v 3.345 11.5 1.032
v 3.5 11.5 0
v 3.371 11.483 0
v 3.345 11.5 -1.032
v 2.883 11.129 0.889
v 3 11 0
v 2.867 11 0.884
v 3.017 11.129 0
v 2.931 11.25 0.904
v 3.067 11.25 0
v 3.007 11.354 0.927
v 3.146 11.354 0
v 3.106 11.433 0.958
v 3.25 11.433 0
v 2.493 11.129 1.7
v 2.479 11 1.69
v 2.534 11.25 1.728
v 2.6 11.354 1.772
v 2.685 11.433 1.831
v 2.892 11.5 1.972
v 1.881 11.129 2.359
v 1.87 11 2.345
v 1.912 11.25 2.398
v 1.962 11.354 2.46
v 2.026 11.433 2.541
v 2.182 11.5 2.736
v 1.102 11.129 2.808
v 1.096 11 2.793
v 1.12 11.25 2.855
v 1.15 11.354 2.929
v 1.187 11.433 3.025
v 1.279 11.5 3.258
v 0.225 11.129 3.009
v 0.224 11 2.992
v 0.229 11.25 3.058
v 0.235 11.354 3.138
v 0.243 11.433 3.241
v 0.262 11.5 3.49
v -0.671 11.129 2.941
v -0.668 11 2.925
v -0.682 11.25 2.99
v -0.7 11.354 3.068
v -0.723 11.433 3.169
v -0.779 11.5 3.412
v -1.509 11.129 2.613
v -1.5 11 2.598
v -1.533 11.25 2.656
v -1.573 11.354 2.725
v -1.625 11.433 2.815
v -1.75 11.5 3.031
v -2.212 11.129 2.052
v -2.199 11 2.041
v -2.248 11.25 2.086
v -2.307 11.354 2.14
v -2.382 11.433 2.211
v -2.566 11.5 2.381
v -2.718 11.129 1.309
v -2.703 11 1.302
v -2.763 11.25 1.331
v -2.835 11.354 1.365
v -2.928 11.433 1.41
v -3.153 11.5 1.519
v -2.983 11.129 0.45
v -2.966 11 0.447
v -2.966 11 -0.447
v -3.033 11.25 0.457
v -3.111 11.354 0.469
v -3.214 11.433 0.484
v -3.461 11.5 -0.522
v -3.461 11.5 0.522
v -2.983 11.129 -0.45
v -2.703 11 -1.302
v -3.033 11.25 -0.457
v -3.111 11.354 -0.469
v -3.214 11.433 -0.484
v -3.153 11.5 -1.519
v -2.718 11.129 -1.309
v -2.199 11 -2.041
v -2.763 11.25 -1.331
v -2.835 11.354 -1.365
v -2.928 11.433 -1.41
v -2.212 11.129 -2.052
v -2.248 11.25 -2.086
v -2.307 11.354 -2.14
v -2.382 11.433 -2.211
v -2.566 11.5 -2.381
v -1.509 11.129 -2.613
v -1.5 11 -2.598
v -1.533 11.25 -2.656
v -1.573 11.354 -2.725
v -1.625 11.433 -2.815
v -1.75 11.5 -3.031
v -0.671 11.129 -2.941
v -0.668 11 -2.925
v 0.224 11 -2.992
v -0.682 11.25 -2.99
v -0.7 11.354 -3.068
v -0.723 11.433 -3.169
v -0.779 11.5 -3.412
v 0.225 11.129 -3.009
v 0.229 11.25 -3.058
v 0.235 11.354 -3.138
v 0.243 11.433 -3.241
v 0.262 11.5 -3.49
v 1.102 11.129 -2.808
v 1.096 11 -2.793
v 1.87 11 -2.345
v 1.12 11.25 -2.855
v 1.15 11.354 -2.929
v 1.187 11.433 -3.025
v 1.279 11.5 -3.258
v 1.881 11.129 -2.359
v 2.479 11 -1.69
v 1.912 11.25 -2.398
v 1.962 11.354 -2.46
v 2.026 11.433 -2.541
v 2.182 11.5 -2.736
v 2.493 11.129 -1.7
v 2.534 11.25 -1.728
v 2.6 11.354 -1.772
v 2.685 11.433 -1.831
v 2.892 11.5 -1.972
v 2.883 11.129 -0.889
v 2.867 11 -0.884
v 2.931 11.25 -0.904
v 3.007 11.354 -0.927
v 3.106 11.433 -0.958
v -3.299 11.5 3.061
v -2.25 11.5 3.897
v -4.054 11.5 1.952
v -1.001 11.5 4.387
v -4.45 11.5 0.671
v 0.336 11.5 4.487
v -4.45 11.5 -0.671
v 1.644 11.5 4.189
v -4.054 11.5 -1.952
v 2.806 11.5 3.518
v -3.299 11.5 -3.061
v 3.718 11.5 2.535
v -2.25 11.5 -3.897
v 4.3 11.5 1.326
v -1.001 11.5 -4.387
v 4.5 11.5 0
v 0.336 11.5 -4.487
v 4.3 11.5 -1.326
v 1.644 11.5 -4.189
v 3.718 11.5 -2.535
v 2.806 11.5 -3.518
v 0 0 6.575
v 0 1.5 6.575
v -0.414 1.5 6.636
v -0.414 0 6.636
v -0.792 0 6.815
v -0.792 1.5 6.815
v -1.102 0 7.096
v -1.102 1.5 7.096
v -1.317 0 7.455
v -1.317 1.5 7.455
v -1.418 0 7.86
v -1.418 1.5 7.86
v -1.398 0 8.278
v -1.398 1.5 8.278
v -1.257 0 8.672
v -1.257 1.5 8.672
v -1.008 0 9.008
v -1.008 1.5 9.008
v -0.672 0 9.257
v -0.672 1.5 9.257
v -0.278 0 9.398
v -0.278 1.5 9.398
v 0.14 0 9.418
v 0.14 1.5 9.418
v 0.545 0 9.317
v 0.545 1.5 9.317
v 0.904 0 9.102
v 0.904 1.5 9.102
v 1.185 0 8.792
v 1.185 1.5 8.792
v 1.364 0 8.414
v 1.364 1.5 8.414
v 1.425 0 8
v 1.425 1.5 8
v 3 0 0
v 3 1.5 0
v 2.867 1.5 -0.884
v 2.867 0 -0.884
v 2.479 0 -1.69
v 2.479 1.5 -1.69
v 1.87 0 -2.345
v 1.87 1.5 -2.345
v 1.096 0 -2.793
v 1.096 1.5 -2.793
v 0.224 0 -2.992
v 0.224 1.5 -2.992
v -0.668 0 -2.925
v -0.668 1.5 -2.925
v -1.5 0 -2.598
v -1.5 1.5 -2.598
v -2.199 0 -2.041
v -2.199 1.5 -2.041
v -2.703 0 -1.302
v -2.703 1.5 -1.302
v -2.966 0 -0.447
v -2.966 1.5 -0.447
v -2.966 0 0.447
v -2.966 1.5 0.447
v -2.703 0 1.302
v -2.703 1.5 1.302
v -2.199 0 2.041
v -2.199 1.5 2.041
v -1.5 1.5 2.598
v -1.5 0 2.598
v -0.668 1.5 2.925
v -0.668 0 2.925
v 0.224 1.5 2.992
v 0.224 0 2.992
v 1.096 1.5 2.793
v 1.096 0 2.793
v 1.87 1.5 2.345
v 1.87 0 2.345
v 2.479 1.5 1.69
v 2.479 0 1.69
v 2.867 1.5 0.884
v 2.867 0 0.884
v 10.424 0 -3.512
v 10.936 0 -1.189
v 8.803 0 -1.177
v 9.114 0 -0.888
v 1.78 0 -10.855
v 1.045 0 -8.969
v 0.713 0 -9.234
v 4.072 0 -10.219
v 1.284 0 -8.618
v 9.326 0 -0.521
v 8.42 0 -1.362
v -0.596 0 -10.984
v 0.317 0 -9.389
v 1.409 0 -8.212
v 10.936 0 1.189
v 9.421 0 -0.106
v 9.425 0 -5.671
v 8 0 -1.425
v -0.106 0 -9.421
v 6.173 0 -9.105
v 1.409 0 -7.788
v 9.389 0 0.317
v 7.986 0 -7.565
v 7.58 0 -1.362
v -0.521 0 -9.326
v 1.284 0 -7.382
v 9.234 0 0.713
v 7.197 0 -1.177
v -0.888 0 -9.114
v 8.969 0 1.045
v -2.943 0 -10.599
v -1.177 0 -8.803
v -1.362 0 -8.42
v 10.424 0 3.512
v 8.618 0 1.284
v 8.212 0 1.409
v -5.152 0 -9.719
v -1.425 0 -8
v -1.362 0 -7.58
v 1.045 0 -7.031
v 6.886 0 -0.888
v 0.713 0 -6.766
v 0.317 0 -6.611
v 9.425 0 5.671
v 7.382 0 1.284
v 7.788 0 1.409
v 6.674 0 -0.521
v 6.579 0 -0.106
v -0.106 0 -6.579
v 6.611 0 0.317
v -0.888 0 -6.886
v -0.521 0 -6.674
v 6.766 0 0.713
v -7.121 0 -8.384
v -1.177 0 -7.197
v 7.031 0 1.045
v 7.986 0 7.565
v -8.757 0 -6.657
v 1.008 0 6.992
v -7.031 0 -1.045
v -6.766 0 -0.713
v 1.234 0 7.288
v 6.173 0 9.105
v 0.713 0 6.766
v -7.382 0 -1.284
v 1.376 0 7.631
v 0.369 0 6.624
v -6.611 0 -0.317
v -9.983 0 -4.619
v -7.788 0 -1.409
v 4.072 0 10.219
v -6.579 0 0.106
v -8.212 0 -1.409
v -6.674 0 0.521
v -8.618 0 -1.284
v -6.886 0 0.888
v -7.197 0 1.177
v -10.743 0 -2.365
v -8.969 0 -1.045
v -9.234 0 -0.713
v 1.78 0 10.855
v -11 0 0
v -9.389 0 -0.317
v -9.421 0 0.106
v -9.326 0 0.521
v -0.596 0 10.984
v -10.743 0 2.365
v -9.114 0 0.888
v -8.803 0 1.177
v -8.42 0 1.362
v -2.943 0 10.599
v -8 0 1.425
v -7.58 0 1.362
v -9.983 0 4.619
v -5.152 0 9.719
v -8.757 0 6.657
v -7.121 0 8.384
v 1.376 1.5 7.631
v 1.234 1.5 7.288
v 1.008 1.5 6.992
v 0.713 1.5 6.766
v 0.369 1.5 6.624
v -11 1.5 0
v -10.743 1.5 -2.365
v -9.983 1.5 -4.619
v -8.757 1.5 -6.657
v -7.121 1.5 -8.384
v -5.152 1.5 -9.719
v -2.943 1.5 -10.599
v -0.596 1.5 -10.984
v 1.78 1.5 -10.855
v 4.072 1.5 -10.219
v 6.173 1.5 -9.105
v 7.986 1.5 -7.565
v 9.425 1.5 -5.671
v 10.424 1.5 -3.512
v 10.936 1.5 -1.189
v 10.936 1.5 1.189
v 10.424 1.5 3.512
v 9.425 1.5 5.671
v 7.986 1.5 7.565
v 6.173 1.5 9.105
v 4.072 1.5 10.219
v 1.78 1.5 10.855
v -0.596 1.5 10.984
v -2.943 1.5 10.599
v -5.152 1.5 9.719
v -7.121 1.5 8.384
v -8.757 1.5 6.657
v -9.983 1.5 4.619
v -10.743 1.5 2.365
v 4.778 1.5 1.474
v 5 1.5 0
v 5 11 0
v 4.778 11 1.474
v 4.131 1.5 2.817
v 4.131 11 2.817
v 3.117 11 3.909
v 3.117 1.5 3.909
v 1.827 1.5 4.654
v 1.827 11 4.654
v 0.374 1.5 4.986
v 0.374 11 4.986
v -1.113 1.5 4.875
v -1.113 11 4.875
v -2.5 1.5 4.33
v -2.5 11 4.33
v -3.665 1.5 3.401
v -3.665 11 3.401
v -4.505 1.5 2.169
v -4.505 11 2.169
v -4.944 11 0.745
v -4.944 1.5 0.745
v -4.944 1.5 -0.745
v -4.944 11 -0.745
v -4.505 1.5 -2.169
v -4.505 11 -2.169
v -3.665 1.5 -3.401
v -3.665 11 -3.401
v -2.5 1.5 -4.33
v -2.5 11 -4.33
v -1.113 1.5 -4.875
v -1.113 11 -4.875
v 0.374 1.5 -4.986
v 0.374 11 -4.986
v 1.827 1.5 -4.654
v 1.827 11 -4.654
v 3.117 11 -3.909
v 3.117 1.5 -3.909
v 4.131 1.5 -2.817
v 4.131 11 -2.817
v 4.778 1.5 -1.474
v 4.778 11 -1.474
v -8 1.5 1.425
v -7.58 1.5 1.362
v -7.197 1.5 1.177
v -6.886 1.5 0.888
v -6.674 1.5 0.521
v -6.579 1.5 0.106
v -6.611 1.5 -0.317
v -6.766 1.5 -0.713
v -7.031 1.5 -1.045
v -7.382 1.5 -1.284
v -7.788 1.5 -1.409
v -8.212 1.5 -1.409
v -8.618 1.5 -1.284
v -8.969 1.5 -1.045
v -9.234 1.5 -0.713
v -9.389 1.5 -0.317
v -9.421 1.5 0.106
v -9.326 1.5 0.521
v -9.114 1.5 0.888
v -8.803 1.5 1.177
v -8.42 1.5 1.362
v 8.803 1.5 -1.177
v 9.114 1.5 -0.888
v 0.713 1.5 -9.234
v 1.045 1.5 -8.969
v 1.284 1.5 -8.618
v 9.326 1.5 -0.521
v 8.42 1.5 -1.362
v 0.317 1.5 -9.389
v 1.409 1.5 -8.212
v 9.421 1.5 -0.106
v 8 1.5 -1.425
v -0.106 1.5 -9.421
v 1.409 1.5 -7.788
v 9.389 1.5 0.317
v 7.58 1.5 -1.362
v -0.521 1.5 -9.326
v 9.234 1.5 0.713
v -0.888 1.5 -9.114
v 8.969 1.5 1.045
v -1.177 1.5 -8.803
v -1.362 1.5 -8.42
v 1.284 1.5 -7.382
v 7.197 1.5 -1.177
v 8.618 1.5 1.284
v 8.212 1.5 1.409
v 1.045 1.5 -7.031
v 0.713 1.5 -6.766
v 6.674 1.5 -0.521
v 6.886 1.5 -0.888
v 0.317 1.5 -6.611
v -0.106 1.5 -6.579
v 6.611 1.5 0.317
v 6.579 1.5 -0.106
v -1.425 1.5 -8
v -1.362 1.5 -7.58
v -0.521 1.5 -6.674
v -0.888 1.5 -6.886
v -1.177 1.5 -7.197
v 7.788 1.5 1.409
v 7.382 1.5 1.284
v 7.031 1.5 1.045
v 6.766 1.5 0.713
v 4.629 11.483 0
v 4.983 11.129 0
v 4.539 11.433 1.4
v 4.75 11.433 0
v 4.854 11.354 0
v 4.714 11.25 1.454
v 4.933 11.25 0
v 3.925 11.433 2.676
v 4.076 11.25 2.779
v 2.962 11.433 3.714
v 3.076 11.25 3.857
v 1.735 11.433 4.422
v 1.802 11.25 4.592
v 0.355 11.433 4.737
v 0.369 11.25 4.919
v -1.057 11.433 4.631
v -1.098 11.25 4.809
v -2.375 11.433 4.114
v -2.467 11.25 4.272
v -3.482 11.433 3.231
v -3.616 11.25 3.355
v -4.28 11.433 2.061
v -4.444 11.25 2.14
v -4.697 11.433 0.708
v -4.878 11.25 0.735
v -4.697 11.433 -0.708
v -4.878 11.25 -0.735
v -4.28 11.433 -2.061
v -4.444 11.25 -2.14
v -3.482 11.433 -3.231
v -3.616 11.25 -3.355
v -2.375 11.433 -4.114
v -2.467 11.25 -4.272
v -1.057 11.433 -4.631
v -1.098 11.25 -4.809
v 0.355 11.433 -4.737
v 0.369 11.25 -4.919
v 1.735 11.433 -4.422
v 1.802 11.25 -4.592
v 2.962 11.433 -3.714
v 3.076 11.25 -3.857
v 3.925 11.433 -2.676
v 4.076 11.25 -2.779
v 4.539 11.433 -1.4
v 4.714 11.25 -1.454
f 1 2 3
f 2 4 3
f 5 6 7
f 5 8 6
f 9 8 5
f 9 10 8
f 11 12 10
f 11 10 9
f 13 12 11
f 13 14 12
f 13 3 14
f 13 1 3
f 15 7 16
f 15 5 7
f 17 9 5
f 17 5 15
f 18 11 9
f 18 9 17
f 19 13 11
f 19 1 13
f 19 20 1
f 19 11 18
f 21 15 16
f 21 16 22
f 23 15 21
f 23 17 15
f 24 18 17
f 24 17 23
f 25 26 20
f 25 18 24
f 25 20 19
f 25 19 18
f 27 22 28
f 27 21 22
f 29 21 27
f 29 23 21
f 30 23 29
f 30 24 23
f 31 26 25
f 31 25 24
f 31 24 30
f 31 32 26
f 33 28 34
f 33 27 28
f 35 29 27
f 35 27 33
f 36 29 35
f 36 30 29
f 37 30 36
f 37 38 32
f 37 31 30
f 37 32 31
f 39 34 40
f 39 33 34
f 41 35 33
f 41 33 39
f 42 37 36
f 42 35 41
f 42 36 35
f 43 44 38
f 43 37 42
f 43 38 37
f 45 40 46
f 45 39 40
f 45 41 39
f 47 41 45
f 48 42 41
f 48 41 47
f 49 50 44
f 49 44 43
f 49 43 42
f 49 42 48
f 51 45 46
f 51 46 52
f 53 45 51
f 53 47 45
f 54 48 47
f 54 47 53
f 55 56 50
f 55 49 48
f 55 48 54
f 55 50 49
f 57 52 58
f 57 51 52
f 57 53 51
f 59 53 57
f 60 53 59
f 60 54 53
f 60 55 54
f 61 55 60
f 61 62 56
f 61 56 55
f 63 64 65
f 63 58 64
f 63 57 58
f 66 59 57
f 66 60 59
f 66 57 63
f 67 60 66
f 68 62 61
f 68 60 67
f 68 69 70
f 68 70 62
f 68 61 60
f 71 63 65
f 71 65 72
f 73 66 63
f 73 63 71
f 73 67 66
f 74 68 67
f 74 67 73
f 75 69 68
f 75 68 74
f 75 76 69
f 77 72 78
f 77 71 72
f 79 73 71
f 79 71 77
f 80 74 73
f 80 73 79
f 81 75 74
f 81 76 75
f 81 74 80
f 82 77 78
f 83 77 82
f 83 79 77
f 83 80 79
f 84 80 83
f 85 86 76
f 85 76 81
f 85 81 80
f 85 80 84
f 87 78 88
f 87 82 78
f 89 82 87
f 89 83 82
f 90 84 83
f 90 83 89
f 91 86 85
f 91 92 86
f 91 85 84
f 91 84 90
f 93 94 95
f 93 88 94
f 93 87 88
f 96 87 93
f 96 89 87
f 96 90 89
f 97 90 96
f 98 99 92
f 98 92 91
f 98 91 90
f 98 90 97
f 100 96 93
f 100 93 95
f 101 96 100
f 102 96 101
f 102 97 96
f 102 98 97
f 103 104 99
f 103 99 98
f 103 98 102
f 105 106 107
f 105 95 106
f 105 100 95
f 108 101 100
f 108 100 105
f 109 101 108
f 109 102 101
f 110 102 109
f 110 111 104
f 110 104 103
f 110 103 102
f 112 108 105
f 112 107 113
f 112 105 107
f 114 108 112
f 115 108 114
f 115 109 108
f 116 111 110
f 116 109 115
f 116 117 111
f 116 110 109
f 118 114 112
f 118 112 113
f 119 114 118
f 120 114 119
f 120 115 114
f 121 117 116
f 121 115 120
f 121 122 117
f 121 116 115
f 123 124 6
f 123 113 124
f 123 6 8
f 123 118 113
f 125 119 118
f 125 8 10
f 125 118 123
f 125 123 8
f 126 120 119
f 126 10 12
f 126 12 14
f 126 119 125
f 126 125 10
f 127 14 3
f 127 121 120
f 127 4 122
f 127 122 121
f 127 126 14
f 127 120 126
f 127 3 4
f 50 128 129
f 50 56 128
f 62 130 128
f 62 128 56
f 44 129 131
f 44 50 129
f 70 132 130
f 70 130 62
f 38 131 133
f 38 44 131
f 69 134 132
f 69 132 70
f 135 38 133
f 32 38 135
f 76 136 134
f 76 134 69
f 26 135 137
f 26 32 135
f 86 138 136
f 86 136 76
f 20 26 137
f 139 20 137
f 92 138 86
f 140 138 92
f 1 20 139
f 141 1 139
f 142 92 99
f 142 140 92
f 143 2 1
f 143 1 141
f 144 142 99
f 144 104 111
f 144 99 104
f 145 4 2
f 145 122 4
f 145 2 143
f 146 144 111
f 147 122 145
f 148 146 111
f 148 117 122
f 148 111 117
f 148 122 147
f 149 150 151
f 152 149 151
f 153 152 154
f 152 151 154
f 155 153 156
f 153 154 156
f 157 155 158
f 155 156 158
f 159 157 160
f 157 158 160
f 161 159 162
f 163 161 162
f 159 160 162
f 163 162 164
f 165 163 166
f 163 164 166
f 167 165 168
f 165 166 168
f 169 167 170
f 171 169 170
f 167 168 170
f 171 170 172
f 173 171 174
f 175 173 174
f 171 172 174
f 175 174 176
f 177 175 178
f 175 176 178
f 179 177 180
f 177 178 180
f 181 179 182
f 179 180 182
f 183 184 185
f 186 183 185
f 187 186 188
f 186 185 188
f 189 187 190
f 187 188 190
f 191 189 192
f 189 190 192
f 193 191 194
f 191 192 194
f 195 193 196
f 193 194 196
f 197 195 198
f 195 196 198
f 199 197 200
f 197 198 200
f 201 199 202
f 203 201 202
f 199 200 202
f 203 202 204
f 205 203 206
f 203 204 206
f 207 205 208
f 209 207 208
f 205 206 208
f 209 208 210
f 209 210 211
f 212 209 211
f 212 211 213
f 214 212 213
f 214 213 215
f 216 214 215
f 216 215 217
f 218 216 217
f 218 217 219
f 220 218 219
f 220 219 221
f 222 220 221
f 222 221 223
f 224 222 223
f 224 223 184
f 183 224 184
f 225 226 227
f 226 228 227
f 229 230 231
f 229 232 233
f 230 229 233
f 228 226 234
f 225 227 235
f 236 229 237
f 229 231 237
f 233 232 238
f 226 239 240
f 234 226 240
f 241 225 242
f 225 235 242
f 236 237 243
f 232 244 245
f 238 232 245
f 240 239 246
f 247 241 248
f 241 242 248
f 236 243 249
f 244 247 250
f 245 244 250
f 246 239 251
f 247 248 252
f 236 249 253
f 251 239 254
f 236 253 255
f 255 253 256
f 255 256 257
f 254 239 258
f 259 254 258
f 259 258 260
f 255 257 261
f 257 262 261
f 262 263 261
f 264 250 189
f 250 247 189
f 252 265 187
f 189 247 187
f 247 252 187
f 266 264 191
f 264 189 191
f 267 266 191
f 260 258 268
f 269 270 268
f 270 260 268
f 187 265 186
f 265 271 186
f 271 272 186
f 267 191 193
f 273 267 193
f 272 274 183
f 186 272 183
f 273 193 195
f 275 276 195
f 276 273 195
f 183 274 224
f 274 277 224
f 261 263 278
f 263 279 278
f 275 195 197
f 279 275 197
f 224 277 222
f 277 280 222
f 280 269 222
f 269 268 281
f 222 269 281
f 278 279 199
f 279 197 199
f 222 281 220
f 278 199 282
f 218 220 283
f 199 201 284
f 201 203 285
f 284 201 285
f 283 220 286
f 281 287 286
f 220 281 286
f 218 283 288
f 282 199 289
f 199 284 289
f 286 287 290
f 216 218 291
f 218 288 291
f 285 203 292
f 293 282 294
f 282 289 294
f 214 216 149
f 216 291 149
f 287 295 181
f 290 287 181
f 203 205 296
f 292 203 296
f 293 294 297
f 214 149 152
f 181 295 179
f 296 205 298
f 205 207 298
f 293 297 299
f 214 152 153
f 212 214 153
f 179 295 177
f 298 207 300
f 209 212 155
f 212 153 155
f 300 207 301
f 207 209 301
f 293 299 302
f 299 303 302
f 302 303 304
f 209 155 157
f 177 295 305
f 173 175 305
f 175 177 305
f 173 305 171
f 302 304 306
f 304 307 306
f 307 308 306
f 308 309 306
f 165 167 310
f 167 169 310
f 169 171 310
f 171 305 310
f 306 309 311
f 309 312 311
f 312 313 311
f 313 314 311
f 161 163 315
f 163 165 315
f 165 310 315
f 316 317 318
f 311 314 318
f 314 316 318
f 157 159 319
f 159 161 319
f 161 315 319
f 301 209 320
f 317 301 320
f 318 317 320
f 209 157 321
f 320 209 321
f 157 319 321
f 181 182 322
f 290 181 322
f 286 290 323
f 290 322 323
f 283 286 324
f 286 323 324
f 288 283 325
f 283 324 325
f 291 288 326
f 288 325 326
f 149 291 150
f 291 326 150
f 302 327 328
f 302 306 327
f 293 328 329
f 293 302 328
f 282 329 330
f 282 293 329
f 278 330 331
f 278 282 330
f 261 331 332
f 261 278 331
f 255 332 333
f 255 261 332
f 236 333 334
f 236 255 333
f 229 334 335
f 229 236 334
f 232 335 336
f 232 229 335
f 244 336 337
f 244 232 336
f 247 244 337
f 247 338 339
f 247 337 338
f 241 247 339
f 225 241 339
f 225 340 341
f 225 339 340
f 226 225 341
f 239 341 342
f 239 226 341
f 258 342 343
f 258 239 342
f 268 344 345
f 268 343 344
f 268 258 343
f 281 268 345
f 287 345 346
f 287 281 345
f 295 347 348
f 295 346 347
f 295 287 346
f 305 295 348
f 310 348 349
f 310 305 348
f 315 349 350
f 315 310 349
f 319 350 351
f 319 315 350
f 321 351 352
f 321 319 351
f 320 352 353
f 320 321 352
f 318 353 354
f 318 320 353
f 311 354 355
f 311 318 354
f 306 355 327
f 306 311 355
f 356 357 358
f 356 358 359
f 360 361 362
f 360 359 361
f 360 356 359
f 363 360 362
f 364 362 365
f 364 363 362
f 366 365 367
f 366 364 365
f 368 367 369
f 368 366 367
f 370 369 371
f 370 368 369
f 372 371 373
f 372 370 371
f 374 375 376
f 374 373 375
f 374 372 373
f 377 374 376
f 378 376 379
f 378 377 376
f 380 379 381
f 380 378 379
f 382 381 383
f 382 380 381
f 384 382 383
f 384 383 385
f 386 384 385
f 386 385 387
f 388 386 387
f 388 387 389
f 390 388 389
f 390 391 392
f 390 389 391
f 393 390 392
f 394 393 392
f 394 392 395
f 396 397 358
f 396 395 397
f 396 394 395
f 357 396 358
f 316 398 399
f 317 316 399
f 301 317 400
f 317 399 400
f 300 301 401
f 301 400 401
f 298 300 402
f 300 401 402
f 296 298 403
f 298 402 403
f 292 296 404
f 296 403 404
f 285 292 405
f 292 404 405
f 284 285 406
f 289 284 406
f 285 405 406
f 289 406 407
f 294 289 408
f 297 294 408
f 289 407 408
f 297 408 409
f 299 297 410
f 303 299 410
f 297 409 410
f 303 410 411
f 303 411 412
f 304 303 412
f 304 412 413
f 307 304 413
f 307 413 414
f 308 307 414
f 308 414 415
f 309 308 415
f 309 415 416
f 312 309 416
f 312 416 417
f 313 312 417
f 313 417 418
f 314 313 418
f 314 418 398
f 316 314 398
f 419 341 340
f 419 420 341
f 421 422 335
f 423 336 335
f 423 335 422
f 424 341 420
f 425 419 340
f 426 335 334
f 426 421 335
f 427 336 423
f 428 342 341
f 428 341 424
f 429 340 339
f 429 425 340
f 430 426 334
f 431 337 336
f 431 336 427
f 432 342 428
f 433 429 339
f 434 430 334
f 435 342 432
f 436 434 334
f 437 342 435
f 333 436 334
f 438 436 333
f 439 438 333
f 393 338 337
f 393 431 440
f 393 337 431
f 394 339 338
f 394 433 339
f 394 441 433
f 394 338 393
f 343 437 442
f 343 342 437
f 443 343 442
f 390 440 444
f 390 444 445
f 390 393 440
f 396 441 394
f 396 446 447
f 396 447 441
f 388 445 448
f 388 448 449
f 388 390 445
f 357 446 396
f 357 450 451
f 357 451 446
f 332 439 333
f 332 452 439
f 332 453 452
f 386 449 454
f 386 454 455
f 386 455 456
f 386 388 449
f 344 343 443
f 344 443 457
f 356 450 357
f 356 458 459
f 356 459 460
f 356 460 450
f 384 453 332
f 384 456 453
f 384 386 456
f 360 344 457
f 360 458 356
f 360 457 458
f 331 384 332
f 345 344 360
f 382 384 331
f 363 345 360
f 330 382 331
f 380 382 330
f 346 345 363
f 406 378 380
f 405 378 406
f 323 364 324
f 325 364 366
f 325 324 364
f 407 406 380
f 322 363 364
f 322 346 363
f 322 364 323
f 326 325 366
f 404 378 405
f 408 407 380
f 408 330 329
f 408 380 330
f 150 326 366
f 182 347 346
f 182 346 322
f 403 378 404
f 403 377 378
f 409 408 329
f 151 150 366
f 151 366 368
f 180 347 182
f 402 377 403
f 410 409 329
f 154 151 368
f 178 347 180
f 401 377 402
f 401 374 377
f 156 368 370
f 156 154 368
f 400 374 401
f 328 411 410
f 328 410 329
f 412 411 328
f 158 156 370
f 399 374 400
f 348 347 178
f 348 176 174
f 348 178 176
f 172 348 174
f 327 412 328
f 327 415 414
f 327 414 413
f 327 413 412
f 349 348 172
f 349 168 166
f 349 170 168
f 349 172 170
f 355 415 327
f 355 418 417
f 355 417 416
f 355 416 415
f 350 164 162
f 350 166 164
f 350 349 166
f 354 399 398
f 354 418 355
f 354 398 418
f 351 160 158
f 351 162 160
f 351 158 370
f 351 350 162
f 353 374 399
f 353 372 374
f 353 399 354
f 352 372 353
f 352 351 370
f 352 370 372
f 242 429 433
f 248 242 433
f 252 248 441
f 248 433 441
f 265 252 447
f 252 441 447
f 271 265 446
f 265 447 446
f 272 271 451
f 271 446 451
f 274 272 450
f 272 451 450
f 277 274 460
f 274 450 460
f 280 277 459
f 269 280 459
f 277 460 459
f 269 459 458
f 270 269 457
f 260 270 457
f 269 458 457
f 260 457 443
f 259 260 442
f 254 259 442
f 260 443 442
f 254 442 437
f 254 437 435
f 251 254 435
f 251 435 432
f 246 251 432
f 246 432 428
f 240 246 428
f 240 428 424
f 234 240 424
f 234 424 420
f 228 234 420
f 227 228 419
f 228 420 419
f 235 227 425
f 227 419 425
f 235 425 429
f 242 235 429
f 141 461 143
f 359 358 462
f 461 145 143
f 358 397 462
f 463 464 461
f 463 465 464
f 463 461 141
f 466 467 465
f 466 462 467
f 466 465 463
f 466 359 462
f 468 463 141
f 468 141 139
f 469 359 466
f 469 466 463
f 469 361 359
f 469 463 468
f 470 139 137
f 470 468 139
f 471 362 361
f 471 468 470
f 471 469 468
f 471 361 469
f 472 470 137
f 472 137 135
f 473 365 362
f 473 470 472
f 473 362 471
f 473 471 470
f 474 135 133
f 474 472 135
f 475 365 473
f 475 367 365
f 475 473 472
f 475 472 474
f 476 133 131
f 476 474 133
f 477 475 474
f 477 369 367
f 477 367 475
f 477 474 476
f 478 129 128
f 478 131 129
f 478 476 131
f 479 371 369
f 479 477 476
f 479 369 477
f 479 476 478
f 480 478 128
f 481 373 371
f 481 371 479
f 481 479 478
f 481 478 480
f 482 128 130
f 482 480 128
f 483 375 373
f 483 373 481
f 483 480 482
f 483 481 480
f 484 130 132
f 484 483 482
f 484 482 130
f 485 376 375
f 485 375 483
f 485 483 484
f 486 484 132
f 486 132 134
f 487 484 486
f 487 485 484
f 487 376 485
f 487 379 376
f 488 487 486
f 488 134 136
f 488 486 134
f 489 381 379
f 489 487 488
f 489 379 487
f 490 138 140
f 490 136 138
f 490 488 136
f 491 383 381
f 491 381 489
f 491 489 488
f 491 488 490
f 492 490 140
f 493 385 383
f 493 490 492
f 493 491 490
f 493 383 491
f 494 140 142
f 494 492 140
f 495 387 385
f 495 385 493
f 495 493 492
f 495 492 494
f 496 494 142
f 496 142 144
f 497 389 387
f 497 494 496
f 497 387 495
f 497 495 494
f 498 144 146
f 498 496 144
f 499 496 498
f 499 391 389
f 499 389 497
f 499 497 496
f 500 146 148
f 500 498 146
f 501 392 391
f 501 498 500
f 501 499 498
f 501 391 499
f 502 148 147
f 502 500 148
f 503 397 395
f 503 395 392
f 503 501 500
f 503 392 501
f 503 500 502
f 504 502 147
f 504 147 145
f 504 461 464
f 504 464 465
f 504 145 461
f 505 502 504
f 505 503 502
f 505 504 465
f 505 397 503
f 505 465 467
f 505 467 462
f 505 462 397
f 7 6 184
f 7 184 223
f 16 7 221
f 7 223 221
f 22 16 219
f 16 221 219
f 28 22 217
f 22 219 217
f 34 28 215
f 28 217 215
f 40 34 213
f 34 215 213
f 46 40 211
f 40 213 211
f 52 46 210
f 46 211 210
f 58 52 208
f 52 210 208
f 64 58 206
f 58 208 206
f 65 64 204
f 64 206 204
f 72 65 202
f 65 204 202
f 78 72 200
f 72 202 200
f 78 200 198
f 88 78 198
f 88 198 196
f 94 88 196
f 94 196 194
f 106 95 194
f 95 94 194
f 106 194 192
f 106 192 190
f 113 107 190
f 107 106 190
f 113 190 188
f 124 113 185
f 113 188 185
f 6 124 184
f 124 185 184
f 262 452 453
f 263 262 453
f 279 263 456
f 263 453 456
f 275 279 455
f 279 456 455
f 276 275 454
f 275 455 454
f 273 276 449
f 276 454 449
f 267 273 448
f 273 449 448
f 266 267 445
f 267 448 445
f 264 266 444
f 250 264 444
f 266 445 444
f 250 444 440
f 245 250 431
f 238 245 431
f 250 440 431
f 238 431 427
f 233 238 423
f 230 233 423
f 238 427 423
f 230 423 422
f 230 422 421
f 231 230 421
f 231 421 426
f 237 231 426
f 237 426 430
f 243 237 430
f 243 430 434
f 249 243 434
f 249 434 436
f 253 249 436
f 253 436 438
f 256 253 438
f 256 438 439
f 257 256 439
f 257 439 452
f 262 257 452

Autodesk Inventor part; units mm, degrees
ref_plane "YZ Plane" through (0, 0, 0) normal (1, 0, 0) x (0, 1, 0)
ref_plane "XZ Plane" through (0, 0, 0) normal (0, 1, 0) x (-1, 0, 0)
ref_plane "XY Plane" through (0, 0, 0) normal (0, 0, 1) x (1, 0, 0)
sketch "Sketch1" plane through (0, 0, 0) normal (0, 1, 0) x (-1, 0, 0)
  circle A0 centre (0, 0) radius 11
  dimension "d0" = 22
extrude "Extrusion1" add sketch "Sketch1" along normal blind 1.5
sketch "Sketch2" plane through (0, 1.5, 0) normal (0, 1, 0) x (1, 0, 0)
  circle A0 centre (0, 0) radius 5
  circle A1 centre (0, 0) radius 3
  dimension "d3" = 10
  dimension "d4" = 6
extrude "Extrusion2" add sketch "Sketch2" along normal blind 10
sketch "Sketch3" plane through (0, 1.5, 0) normal (0, 1, 0) x (1, 0, 0)
  circle A0 centre (0, 0) radius 3
  dimension "d7" = 6
extrude "Extrusion3" cut sketch "Sketch3" against normal blind 1.5
sketch "Sketch4" plane through (0, 1.5, 0) normal (0, 1, 0) x (1, 0, 0)
  circle A0 centre (0, -8) radius 1.425
  line L0 (0, 0) -> (0, -8)
  line L1 (0, 0) -> (-11, 0)
  circle A1 centre (0, 0) radius 11 projected
  dimension "d10" = 2.85
  dimension "d11" = 8
extrude "Extrusion4" cut sketch "Sketch4" against normal blind 1.5 contours A0
pattern_circular "Circular Pattern1" count 4 over 360 about axis through (0, 1.5, 0) along (0, 1, 0) of "Extrusion4"
fillet "Fillet1" radius 0.5 1 edges at (-3, 11.5, 0)
fillet "Fillet2" radius 0.5 1 edges at (-5, 11.5, 0)
properties part number "Stepper_Coupler"
